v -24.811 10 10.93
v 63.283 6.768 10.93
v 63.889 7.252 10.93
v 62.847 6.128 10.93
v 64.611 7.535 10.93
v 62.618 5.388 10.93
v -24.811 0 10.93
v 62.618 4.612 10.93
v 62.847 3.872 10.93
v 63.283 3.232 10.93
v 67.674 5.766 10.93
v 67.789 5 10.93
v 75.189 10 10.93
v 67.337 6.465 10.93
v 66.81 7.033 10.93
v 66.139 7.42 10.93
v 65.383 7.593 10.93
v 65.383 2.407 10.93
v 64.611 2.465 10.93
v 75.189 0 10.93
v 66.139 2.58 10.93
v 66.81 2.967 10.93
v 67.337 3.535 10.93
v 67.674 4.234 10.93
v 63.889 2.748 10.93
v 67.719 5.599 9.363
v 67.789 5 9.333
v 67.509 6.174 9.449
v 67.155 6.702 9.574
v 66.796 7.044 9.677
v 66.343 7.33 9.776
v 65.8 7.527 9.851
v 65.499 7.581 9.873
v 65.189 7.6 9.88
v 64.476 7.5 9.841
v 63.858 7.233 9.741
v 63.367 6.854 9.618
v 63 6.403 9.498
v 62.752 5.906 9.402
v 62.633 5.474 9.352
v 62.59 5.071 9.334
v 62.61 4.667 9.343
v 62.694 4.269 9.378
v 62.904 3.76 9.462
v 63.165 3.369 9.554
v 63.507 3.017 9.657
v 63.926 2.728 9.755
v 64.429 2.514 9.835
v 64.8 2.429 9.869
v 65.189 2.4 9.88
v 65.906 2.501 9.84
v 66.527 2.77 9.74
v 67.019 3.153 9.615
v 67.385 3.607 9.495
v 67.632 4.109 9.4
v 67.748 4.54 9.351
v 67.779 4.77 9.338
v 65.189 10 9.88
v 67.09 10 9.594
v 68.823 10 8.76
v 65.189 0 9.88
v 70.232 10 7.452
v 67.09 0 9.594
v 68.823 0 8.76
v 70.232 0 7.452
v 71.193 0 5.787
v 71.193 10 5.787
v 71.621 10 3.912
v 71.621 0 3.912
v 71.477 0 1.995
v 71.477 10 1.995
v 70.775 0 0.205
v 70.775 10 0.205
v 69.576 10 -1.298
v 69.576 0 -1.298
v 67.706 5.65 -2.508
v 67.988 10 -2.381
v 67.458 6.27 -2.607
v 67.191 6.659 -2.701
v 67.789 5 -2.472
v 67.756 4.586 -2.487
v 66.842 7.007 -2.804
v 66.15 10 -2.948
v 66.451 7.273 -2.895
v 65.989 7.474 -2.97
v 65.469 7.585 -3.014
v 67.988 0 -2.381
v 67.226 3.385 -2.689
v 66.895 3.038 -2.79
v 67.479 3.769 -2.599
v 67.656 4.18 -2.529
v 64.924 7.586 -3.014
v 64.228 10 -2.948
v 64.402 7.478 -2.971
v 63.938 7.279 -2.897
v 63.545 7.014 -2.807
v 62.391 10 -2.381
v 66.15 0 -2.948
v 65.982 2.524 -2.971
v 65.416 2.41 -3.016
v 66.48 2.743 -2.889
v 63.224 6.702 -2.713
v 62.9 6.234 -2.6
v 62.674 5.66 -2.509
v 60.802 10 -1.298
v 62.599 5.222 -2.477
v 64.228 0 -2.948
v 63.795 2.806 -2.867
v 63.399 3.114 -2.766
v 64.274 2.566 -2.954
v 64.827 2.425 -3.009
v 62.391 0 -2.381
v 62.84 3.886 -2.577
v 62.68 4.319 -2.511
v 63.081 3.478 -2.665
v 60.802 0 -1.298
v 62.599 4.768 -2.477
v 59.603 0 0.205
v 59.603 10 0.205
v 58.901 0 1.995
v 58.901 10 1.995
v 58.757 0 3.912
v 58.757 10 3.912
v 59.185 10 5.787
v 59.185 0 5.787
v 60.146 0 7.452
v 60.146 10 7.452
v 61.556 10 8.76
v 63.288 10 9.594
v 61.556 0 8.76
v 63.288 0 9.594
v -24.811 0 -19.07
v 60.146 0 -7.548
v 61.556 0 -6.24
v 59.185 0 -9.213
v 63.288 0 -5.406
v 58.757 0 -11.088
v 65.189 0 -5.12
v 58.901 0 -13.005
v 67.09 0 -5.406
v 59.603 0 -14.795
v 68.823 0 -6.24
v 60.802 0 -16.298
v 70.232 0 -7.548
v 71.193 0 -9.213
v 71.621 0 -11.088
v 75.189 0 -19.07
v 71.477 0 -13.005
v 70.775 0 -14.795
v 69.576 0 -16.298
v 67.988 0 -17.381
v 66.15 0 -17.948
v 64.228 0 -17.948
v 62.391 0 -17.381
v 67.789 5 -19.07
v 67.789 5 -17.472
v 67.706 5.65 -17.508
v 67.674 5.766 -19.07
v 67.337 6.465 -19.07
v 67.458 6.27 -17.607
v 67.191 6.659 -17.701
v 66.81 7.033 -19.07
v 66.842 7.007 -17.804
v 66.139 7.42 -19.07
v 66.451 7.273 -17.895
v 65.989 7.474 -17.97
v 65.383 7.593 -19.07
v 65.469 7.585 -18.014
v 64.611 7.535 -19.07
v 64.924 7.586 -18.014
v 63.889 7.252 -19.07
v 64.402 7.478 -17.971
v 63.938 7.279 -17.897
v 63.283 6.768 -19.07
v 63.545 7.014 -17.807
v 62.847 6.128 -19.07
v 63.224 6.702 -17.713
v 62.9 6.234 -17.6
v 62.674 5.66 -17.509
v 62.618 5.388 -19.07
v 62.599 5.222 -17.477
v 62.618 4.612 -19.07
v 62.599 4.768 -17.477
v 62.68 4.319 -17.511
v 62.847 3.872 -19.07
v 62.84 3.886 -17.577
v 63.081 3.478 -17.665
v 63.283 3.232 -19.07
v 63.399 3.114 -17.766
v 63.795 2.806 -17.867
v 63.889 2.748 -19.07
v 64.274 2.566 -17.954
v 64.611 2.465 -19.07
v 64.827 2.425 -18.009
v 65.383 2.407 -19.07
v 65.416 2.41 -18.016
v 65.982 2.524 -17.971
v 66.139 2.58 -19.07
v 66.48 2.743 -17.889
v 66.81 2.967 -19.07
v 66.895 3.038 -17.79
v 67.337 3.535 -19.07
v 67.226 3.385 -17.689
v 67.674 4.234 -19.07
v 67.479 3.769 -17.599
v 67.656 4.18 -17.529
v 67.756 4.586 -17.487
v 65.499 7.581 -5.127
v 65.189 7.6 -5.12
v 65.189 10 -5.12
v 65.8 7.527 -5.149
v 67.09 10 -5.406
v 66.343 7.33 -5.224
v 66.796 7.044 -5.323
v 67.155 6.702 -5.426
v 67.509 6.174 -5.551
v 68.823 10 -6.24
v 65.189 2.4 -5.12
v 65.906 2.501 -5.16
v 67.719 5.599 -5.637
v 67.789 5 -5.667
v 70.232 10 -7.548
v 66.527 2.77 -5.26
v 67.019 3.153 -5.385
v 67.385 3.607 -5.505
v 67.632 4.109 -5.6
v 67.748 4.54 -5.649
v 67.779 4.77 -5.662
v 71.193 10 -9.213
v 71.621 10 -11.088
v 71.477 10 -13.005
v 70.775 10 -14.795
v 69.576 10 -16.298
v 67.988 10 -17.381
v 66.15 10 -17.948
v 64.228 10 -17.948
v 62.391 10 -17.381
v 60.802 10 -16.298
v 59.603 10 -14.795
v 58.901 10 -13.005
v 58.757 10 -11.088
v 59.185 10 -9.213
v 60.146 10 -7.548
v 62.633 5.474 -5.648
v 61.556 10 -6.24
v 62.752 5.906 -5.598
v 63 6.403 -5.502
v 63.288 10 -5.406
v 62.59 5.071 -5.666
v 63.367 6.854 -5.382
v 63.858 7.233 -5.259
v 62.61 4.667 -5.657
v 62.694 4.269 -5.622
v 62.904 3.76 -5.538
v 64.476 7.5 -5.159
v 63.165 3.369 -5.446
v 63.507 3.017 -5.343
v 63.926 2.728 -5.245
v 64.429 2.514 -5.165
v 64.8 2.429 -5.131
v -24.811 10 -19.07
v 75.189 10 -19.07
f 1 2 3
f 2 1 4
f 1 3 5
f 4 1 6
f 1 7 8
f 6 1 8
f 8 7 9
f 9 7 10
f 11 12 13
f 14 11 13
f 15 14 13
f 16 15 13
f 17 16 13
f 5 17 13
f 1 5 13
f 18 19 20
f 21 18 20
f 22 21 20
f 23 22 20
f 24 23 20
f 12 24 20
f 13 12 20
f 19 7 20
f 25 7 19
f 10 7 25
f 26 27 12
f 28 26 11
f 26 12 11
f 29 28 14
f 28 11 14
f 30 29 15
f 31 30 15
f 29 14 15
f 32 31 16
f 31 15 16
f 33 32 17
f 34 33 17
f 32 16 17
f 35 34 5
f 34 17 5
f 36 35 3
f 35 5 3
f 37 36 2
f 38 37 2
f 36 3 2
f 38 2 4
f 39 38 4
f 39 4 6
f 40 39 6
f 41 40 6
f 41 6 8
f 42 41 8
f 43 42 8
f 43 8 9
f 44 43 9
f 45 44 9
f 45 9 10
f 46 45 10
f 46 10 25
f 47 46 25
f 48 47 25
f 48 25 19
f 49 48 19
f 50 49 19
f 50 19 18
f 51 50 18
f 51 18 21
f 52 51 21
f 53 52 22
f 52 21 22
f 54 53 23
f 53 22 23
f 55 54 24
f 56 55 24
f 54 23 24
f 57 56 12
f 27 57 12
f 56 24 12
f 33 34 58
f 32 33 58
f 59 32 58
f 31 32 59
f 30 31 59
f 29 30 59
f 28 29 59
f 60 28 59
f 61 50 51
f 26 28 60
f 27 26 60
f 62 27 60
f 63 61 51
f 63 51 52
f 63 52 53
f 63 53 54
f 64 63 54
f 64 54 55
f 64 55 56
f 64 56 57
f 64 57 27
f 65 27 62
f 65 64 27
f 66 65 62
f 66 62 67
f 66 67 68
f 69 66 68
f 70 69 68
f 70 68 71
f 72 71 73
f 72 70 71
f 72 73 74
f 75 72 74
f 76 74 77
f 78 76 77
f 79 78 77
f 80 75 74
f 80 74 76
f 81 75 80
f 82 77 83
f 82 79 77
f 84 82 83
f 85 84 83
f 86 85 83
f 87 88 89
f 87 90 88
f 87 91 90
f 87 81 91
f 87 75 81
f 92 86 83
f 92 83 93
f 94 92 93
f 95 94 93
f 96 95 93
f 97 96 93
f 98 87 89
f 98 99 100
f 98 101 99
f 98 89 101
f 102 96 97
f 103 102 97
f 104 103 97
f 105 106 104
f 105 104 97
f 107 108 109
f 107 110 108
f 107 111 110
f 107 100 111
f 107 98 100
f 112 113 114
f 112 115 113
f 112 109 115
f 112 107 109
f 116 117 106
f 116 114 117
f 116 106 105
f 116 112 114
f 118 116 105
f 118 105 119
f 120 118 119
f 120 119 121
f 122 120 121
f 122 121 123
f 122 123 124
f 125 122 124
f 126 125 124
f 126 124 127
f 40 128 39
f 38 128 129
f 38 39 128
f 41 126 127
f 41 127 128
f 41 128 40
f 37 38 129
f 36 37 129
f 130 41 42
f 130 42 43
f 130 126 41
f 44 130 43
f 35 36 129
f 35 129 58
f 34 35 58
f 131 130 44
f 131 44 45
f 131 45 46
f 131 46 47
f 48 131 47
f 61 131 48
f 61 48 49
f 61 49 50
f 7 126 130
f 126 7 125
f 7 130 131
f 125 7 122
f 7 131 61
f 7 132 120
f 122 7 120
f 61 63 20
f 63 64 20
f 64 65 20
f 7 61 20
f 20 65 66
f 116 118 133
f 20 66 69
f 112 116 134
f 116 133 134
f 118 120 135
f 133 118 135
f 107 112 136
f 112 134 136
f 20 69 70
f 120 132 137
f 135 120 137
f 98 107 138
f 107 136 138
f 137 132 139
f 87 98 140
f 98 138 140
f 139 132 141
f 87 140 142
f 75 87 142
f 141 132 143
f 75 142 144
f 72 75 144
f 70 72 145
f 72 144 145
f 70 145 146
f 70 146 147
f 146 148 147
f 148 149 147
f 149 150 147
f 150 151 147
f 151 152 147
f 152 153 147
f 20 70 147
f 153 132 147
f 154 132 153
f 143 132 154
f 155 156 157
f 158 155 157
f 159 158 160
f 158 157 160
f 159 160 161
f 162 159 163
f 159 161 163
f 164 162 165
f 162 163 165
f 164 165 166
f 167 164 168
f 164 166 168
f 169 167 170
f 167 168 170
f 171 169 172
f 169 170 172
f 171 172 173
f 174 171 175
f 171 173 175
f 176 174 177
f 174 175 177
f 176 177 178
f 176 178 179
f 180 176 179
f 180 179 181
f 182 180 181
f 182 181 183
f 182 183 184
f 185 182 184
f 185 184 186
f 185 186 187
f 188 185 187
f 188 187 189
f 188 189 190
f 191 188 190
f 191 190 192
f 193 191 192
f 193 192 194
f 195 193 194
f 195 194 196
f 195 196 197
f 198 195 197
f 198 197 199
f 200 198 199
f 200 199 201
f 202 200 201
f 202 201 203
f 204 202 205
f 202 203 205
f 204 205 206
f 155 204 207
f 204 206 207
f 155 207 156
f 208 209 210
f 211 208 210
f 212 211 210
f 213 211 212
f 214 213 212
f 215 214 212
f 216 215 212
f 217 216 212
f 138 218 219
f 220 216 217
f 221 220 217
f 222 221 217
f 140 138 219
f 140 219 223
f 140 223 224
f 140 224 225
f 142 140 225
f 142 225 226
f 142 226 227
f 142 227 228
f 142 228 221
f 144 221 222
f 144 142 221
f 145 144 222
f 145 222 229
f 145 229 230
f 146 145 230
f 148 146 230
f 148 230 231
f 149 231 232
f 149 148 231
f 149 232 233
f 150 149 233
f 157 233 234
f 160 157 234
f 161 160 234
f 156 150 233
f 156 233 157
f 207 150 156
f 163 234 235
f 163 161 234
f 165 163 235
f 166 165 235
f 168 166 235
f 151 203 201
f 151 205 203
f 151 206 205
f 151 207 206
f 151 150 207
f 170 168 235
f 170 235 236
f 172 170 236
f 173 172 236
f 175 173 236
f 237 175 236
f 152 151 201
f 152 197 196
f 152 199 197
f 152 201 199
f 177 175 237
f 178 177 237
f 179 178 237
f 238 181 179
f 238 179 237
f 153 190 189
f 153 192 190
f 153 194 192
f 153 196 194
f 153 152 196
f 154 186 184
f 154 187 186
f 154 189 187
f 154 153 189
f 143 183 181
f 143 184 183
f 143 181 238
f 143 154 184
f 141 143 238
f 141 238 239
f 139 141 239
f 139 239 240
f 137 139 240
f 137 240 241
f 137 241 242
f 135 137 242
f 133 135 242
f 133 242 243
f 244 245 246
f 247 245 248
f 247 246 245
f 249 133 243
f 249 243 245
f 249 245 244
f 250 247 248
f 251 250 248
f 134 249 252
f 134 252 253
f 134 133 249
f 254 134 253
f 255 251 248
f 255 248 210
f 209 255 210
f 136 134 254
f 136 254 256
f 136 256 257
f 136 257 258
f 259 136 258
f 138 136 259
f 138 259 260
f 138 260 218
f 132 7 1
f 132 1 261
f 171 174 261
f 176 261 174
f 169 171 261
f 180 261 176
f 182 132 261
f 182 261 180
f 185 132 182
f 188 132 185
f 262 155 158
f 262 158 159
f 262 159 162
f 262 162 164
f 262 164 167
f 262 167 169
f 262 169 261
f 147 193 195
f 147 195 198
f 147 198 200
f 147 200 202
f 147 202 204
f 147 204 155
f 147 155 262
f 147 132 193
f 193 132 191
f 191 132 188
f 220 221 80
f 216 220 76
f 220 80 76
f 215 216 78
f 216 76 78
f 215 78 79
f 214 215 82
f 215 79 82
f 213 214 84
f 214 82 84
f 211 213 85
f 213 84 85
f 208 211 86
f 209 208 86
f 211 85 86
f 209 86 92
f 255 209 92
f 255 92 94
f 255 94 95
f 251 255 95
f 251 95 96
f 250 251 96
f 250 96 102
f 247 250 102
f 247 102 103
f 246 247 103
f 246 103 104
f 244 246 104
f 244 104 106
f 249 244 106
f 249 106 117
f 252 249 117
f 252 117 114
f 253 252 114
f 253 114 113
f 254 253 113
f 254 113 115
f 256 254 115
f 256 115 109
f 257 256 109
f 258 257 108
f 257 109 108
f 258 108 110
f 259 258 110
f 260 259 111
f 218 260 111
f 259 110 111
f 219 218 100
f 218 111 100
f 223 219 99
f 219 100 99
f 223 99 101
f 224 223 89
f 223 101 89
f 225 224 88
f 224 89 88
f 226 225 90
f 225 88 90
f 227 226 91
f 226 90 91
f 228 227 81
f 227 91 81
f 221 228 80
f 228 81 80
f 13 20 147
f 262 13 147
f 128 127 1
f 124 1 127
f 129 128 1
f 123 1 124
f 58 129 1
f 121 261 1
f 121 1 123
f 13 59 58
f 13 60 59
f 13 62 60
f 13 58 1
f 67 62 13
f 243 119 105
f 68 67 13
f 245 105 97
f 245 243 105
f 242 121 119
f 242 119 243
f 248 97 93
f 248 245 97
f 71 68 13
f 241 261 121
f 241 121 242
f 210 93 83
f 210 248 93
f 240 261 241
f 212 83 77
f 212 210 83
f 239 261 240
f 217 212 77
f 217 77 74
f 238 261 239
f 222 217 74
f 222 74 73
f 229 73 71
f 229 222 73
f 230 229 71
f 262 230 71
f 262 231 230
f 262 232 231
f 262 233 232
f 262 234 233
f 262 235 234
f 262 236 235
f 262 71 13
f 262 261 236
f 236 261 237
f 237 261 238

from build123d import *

# Parameters (mm, degrees)
SKETCH1_W           = 100
SKETCH1_H           = 30
SKETCH1_R           = 6.45
BOSS_EXTRUDE1_DEPTH = 10
SKETCH2_R           = 2.6
CUT_EXTRUDE1_DEPTH  = 82.56838771


with BuildPart() as part:
    # Sketch1 → Boss-Extrude1 (new body)
    with BuildSketch(Plane(origin=(0, 0, 0), x_dir=(1, 0, 0), z_dir=(0, 1, 0))):
        with Locations((25.189107413, 4.069591528)):
            Rectangle(SKETCH1_W, SKETCH1_H)
        with Locations(Location((65.189107413, 11.569591528, 0), (0, 0, 270))):
            Circle(SKETCH1_R, mode=Mode.SUBTRACT)
        with Locations(Location((65.189107413, -3.430408472, 0), (0, 0, 270))):
            Circle(SKETCH1_R, mode=Mode.SUBTRACT)
    extrude(amount=BOSS_EXTRUDE1_DEPTH)

    # Sketch2 → Cut-Extrude1 (cut, through all)
    with BuildSketch(Plane.XY.offset(10.930408472)):
        with Locations((65.189107413, 5)):
            Circle(SKETCH2_R)
    extrude(amount=-CUT_EXTRUDE1_DEPTH, mode=Mode.SUBTRACT)


solid = part.part
